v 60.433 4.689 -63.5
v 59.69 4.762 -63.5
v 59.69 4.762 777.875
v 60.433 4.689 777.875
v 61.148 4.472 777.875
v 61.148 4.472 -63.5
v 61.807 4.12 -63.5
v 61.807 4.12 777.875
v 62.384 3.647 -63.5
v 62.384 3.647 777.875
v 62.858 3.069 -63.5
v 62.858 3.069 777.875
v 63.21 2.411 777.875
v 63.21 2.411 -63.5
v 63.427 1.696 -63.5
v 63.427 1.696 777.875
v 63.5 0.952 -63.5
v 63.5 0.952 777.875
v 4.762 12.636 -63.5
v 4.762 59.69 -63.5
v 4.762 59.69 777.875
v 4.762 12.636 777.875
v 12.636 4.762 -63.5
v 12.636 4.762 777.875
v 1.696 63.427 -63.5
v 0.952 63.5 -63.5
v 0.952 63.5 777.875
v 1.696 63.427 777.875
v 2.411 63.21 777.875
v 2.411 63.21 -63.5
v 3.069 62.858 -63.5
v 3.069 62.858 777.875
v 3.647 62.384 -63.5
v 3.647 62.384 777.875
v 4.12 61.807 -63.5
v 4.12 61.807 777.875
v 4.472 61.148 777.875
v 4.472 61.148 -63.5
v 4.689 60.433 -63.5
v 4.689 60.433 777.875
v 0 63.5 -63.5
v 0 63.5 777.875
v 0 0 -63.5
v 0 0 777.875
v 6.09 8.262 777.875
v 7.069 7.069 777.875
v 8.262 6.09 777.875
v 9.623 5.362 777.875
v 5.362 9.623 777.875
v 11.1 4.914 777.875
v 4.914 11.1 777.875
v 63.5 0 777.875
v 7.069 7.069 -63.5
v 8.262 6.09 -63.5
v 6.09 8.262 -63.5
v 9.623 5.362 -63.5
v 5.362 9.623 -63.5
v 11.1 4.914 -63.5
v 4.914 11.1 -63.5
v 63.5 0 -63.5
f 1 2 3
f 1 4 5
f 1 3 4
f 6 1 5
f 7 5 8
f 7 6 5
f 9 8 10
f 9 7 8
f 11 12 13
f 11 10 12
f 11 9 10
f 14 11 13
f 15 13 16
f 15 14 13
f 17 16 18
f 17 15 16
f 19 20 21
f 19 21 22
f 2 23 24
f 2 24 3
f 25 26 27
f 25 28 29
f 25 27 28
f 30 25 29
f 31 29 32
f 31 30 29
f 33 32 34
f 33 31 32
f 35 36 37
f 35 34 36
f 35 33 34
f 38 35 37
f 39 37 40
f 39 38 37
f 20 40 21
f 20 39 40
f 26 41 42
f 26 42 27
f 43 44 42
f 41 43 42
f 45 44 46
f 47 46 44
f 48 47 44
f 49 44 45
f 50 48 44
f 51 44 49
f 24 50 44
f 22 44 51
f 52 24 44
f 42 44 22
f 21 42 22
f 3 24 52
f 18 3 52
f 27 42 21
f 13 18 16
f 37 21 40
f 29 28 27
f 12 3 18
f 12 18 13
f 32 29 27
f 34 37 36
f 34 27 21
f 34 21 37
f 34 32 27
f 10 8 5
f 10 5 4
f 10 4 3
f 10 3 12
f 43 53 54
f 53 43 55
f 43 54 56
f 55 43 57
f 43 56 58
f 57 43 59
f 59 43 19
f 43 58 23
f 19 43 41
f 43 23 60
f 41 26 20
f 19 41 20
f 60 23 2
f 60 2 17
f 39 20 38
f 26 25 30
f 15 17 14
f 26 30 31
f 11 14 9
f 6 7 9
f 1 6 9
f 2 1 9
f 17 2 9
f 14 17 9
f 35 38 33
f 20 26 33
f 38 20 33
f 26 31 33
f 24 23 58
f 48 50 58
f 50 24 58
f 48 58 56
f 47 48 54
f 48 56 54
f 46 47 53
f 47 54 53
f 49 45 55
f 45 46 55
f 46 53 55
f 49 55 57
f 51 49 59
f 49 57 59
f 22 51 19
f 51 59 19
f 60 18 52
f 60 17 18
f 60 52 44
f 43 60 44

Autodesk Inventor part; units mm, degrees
ref_plane "Start plane" through (0, 0, -63.5) normal (0, 0, 1) x (1, 0, 0)
ref_plane "End plane" through (0, 0, 777.875) normal (0, 0, 1) x (1, 0, 0)
sketch "Sketch" plane through (0, 0, 0) normal (0, 0, 1) x (1, 0, 0)
  line L0 (63.5, 0) -> (0, 0)
  line L1 (0, 0) -> (0, 63.5)
  line L2 (0, 63.5) -> (0.9525, 63.5)
  line L3 (4.7625, 59.69) -> (4.7625, 12.6365)
  line L4 (12.6365, 4.7625) -> (59.69, 4.7625)
  line L5 (63.5, 0.9525) -> (63.5, 0)
  line L6 (0, -11.0414) -> (0, 31.5385) construction
  line L7 (-11.0414, 0) -> (31.5385, 0) construction
  arc A0 (4.7625, 12.6365) -> (12.6365, 4.7625) centre (12.6365, 12.6365) ccw
  arc A1 (4.7625, 59.69) -> (0.9525, 63.5) centre (0.9525, 59.69) ccw
  arc A2 (63.5, 0.9525) -> (59.69, 4.7625) centre (59.69, 0.9525) ccw
  line L8 (0, 79.3552) -> (0, -26.1075) construction
  line L9 (-26.1075, 0) -> (79.3552, 0) construction
  point P0 (4.7625, 63.5)
  point P1 (4.7625, 4.7625)
  point P2 (63.5, 4.7625)
  dimension "d0" = 63.5
  dimension "d1" = 63.5
  dimension "d2" = 4.7625
  dimension "d3" = 4.7625
  dimension "d10" = 0
  dimension "d11" = 0
  dimension "d14" = 7.874
  dimension "d15" = 3.81
extrude "Body" add sketch "Sketch" along normal up to surface (841.375 mm away) from surface at -63.5
sketch "Sketch3" plane through (0, 0, 0) normal (0, 0, 1) x (1, 0, 0)
  line L0 (0, 0) -> (10, 0)
ref_plane "Work Plane4" through (0, 0, 0) normal (0, -1, 0) x (1, 0, 0)
sketch "Sketch4" plane through (0, 0, 0) normal (0, -1, 0) x (1, 0, 0)
  line L0 (-2, -63.5) -> (12, -63.5)
  line L1 (-2, 777.875) -> (12, 777.875)
  dimension "d17" = 841.375
ref_plane "Work Plane3" through (0, -454.025, -63.5) normal (0, 0, -1) x (-1, 0, 0)
split "Split1" plane through (0, -454.025, -63.5) removes the side toward (0, 0, -1)
equation "\"d0\" = G_H"
equation "\"d1\" = G_H"
equation "\"d2\" = G_T"
equation "\"d3\" = G_T"
equation "\"d14\" = G_IR"
equation "\"d15\" = G_ER"
equation "\"d4\" = G_L"
equation "\"G_H\" = 63.5"
equation "\"G_T\" = 4.7625"
equation "\"G_ER\" = 3.81"
equation "\"G_IR\" = 7.874"
equation "\"G_L\" = d17"
equation "\"ex\" = 0"
equation "\"G_OFFSET_START\" = 63.5"
equation "\"G_OFFSET_END\" = 0"
equation "\"d12\" = -G_OFFSET_START"
equation "\"d13\" = G_OFFSET_END + B_L"
equation "\"B_L\" = 777.875"
properties part number "ANSI L 2.5 x 2.5 x 3_16 00000003"
